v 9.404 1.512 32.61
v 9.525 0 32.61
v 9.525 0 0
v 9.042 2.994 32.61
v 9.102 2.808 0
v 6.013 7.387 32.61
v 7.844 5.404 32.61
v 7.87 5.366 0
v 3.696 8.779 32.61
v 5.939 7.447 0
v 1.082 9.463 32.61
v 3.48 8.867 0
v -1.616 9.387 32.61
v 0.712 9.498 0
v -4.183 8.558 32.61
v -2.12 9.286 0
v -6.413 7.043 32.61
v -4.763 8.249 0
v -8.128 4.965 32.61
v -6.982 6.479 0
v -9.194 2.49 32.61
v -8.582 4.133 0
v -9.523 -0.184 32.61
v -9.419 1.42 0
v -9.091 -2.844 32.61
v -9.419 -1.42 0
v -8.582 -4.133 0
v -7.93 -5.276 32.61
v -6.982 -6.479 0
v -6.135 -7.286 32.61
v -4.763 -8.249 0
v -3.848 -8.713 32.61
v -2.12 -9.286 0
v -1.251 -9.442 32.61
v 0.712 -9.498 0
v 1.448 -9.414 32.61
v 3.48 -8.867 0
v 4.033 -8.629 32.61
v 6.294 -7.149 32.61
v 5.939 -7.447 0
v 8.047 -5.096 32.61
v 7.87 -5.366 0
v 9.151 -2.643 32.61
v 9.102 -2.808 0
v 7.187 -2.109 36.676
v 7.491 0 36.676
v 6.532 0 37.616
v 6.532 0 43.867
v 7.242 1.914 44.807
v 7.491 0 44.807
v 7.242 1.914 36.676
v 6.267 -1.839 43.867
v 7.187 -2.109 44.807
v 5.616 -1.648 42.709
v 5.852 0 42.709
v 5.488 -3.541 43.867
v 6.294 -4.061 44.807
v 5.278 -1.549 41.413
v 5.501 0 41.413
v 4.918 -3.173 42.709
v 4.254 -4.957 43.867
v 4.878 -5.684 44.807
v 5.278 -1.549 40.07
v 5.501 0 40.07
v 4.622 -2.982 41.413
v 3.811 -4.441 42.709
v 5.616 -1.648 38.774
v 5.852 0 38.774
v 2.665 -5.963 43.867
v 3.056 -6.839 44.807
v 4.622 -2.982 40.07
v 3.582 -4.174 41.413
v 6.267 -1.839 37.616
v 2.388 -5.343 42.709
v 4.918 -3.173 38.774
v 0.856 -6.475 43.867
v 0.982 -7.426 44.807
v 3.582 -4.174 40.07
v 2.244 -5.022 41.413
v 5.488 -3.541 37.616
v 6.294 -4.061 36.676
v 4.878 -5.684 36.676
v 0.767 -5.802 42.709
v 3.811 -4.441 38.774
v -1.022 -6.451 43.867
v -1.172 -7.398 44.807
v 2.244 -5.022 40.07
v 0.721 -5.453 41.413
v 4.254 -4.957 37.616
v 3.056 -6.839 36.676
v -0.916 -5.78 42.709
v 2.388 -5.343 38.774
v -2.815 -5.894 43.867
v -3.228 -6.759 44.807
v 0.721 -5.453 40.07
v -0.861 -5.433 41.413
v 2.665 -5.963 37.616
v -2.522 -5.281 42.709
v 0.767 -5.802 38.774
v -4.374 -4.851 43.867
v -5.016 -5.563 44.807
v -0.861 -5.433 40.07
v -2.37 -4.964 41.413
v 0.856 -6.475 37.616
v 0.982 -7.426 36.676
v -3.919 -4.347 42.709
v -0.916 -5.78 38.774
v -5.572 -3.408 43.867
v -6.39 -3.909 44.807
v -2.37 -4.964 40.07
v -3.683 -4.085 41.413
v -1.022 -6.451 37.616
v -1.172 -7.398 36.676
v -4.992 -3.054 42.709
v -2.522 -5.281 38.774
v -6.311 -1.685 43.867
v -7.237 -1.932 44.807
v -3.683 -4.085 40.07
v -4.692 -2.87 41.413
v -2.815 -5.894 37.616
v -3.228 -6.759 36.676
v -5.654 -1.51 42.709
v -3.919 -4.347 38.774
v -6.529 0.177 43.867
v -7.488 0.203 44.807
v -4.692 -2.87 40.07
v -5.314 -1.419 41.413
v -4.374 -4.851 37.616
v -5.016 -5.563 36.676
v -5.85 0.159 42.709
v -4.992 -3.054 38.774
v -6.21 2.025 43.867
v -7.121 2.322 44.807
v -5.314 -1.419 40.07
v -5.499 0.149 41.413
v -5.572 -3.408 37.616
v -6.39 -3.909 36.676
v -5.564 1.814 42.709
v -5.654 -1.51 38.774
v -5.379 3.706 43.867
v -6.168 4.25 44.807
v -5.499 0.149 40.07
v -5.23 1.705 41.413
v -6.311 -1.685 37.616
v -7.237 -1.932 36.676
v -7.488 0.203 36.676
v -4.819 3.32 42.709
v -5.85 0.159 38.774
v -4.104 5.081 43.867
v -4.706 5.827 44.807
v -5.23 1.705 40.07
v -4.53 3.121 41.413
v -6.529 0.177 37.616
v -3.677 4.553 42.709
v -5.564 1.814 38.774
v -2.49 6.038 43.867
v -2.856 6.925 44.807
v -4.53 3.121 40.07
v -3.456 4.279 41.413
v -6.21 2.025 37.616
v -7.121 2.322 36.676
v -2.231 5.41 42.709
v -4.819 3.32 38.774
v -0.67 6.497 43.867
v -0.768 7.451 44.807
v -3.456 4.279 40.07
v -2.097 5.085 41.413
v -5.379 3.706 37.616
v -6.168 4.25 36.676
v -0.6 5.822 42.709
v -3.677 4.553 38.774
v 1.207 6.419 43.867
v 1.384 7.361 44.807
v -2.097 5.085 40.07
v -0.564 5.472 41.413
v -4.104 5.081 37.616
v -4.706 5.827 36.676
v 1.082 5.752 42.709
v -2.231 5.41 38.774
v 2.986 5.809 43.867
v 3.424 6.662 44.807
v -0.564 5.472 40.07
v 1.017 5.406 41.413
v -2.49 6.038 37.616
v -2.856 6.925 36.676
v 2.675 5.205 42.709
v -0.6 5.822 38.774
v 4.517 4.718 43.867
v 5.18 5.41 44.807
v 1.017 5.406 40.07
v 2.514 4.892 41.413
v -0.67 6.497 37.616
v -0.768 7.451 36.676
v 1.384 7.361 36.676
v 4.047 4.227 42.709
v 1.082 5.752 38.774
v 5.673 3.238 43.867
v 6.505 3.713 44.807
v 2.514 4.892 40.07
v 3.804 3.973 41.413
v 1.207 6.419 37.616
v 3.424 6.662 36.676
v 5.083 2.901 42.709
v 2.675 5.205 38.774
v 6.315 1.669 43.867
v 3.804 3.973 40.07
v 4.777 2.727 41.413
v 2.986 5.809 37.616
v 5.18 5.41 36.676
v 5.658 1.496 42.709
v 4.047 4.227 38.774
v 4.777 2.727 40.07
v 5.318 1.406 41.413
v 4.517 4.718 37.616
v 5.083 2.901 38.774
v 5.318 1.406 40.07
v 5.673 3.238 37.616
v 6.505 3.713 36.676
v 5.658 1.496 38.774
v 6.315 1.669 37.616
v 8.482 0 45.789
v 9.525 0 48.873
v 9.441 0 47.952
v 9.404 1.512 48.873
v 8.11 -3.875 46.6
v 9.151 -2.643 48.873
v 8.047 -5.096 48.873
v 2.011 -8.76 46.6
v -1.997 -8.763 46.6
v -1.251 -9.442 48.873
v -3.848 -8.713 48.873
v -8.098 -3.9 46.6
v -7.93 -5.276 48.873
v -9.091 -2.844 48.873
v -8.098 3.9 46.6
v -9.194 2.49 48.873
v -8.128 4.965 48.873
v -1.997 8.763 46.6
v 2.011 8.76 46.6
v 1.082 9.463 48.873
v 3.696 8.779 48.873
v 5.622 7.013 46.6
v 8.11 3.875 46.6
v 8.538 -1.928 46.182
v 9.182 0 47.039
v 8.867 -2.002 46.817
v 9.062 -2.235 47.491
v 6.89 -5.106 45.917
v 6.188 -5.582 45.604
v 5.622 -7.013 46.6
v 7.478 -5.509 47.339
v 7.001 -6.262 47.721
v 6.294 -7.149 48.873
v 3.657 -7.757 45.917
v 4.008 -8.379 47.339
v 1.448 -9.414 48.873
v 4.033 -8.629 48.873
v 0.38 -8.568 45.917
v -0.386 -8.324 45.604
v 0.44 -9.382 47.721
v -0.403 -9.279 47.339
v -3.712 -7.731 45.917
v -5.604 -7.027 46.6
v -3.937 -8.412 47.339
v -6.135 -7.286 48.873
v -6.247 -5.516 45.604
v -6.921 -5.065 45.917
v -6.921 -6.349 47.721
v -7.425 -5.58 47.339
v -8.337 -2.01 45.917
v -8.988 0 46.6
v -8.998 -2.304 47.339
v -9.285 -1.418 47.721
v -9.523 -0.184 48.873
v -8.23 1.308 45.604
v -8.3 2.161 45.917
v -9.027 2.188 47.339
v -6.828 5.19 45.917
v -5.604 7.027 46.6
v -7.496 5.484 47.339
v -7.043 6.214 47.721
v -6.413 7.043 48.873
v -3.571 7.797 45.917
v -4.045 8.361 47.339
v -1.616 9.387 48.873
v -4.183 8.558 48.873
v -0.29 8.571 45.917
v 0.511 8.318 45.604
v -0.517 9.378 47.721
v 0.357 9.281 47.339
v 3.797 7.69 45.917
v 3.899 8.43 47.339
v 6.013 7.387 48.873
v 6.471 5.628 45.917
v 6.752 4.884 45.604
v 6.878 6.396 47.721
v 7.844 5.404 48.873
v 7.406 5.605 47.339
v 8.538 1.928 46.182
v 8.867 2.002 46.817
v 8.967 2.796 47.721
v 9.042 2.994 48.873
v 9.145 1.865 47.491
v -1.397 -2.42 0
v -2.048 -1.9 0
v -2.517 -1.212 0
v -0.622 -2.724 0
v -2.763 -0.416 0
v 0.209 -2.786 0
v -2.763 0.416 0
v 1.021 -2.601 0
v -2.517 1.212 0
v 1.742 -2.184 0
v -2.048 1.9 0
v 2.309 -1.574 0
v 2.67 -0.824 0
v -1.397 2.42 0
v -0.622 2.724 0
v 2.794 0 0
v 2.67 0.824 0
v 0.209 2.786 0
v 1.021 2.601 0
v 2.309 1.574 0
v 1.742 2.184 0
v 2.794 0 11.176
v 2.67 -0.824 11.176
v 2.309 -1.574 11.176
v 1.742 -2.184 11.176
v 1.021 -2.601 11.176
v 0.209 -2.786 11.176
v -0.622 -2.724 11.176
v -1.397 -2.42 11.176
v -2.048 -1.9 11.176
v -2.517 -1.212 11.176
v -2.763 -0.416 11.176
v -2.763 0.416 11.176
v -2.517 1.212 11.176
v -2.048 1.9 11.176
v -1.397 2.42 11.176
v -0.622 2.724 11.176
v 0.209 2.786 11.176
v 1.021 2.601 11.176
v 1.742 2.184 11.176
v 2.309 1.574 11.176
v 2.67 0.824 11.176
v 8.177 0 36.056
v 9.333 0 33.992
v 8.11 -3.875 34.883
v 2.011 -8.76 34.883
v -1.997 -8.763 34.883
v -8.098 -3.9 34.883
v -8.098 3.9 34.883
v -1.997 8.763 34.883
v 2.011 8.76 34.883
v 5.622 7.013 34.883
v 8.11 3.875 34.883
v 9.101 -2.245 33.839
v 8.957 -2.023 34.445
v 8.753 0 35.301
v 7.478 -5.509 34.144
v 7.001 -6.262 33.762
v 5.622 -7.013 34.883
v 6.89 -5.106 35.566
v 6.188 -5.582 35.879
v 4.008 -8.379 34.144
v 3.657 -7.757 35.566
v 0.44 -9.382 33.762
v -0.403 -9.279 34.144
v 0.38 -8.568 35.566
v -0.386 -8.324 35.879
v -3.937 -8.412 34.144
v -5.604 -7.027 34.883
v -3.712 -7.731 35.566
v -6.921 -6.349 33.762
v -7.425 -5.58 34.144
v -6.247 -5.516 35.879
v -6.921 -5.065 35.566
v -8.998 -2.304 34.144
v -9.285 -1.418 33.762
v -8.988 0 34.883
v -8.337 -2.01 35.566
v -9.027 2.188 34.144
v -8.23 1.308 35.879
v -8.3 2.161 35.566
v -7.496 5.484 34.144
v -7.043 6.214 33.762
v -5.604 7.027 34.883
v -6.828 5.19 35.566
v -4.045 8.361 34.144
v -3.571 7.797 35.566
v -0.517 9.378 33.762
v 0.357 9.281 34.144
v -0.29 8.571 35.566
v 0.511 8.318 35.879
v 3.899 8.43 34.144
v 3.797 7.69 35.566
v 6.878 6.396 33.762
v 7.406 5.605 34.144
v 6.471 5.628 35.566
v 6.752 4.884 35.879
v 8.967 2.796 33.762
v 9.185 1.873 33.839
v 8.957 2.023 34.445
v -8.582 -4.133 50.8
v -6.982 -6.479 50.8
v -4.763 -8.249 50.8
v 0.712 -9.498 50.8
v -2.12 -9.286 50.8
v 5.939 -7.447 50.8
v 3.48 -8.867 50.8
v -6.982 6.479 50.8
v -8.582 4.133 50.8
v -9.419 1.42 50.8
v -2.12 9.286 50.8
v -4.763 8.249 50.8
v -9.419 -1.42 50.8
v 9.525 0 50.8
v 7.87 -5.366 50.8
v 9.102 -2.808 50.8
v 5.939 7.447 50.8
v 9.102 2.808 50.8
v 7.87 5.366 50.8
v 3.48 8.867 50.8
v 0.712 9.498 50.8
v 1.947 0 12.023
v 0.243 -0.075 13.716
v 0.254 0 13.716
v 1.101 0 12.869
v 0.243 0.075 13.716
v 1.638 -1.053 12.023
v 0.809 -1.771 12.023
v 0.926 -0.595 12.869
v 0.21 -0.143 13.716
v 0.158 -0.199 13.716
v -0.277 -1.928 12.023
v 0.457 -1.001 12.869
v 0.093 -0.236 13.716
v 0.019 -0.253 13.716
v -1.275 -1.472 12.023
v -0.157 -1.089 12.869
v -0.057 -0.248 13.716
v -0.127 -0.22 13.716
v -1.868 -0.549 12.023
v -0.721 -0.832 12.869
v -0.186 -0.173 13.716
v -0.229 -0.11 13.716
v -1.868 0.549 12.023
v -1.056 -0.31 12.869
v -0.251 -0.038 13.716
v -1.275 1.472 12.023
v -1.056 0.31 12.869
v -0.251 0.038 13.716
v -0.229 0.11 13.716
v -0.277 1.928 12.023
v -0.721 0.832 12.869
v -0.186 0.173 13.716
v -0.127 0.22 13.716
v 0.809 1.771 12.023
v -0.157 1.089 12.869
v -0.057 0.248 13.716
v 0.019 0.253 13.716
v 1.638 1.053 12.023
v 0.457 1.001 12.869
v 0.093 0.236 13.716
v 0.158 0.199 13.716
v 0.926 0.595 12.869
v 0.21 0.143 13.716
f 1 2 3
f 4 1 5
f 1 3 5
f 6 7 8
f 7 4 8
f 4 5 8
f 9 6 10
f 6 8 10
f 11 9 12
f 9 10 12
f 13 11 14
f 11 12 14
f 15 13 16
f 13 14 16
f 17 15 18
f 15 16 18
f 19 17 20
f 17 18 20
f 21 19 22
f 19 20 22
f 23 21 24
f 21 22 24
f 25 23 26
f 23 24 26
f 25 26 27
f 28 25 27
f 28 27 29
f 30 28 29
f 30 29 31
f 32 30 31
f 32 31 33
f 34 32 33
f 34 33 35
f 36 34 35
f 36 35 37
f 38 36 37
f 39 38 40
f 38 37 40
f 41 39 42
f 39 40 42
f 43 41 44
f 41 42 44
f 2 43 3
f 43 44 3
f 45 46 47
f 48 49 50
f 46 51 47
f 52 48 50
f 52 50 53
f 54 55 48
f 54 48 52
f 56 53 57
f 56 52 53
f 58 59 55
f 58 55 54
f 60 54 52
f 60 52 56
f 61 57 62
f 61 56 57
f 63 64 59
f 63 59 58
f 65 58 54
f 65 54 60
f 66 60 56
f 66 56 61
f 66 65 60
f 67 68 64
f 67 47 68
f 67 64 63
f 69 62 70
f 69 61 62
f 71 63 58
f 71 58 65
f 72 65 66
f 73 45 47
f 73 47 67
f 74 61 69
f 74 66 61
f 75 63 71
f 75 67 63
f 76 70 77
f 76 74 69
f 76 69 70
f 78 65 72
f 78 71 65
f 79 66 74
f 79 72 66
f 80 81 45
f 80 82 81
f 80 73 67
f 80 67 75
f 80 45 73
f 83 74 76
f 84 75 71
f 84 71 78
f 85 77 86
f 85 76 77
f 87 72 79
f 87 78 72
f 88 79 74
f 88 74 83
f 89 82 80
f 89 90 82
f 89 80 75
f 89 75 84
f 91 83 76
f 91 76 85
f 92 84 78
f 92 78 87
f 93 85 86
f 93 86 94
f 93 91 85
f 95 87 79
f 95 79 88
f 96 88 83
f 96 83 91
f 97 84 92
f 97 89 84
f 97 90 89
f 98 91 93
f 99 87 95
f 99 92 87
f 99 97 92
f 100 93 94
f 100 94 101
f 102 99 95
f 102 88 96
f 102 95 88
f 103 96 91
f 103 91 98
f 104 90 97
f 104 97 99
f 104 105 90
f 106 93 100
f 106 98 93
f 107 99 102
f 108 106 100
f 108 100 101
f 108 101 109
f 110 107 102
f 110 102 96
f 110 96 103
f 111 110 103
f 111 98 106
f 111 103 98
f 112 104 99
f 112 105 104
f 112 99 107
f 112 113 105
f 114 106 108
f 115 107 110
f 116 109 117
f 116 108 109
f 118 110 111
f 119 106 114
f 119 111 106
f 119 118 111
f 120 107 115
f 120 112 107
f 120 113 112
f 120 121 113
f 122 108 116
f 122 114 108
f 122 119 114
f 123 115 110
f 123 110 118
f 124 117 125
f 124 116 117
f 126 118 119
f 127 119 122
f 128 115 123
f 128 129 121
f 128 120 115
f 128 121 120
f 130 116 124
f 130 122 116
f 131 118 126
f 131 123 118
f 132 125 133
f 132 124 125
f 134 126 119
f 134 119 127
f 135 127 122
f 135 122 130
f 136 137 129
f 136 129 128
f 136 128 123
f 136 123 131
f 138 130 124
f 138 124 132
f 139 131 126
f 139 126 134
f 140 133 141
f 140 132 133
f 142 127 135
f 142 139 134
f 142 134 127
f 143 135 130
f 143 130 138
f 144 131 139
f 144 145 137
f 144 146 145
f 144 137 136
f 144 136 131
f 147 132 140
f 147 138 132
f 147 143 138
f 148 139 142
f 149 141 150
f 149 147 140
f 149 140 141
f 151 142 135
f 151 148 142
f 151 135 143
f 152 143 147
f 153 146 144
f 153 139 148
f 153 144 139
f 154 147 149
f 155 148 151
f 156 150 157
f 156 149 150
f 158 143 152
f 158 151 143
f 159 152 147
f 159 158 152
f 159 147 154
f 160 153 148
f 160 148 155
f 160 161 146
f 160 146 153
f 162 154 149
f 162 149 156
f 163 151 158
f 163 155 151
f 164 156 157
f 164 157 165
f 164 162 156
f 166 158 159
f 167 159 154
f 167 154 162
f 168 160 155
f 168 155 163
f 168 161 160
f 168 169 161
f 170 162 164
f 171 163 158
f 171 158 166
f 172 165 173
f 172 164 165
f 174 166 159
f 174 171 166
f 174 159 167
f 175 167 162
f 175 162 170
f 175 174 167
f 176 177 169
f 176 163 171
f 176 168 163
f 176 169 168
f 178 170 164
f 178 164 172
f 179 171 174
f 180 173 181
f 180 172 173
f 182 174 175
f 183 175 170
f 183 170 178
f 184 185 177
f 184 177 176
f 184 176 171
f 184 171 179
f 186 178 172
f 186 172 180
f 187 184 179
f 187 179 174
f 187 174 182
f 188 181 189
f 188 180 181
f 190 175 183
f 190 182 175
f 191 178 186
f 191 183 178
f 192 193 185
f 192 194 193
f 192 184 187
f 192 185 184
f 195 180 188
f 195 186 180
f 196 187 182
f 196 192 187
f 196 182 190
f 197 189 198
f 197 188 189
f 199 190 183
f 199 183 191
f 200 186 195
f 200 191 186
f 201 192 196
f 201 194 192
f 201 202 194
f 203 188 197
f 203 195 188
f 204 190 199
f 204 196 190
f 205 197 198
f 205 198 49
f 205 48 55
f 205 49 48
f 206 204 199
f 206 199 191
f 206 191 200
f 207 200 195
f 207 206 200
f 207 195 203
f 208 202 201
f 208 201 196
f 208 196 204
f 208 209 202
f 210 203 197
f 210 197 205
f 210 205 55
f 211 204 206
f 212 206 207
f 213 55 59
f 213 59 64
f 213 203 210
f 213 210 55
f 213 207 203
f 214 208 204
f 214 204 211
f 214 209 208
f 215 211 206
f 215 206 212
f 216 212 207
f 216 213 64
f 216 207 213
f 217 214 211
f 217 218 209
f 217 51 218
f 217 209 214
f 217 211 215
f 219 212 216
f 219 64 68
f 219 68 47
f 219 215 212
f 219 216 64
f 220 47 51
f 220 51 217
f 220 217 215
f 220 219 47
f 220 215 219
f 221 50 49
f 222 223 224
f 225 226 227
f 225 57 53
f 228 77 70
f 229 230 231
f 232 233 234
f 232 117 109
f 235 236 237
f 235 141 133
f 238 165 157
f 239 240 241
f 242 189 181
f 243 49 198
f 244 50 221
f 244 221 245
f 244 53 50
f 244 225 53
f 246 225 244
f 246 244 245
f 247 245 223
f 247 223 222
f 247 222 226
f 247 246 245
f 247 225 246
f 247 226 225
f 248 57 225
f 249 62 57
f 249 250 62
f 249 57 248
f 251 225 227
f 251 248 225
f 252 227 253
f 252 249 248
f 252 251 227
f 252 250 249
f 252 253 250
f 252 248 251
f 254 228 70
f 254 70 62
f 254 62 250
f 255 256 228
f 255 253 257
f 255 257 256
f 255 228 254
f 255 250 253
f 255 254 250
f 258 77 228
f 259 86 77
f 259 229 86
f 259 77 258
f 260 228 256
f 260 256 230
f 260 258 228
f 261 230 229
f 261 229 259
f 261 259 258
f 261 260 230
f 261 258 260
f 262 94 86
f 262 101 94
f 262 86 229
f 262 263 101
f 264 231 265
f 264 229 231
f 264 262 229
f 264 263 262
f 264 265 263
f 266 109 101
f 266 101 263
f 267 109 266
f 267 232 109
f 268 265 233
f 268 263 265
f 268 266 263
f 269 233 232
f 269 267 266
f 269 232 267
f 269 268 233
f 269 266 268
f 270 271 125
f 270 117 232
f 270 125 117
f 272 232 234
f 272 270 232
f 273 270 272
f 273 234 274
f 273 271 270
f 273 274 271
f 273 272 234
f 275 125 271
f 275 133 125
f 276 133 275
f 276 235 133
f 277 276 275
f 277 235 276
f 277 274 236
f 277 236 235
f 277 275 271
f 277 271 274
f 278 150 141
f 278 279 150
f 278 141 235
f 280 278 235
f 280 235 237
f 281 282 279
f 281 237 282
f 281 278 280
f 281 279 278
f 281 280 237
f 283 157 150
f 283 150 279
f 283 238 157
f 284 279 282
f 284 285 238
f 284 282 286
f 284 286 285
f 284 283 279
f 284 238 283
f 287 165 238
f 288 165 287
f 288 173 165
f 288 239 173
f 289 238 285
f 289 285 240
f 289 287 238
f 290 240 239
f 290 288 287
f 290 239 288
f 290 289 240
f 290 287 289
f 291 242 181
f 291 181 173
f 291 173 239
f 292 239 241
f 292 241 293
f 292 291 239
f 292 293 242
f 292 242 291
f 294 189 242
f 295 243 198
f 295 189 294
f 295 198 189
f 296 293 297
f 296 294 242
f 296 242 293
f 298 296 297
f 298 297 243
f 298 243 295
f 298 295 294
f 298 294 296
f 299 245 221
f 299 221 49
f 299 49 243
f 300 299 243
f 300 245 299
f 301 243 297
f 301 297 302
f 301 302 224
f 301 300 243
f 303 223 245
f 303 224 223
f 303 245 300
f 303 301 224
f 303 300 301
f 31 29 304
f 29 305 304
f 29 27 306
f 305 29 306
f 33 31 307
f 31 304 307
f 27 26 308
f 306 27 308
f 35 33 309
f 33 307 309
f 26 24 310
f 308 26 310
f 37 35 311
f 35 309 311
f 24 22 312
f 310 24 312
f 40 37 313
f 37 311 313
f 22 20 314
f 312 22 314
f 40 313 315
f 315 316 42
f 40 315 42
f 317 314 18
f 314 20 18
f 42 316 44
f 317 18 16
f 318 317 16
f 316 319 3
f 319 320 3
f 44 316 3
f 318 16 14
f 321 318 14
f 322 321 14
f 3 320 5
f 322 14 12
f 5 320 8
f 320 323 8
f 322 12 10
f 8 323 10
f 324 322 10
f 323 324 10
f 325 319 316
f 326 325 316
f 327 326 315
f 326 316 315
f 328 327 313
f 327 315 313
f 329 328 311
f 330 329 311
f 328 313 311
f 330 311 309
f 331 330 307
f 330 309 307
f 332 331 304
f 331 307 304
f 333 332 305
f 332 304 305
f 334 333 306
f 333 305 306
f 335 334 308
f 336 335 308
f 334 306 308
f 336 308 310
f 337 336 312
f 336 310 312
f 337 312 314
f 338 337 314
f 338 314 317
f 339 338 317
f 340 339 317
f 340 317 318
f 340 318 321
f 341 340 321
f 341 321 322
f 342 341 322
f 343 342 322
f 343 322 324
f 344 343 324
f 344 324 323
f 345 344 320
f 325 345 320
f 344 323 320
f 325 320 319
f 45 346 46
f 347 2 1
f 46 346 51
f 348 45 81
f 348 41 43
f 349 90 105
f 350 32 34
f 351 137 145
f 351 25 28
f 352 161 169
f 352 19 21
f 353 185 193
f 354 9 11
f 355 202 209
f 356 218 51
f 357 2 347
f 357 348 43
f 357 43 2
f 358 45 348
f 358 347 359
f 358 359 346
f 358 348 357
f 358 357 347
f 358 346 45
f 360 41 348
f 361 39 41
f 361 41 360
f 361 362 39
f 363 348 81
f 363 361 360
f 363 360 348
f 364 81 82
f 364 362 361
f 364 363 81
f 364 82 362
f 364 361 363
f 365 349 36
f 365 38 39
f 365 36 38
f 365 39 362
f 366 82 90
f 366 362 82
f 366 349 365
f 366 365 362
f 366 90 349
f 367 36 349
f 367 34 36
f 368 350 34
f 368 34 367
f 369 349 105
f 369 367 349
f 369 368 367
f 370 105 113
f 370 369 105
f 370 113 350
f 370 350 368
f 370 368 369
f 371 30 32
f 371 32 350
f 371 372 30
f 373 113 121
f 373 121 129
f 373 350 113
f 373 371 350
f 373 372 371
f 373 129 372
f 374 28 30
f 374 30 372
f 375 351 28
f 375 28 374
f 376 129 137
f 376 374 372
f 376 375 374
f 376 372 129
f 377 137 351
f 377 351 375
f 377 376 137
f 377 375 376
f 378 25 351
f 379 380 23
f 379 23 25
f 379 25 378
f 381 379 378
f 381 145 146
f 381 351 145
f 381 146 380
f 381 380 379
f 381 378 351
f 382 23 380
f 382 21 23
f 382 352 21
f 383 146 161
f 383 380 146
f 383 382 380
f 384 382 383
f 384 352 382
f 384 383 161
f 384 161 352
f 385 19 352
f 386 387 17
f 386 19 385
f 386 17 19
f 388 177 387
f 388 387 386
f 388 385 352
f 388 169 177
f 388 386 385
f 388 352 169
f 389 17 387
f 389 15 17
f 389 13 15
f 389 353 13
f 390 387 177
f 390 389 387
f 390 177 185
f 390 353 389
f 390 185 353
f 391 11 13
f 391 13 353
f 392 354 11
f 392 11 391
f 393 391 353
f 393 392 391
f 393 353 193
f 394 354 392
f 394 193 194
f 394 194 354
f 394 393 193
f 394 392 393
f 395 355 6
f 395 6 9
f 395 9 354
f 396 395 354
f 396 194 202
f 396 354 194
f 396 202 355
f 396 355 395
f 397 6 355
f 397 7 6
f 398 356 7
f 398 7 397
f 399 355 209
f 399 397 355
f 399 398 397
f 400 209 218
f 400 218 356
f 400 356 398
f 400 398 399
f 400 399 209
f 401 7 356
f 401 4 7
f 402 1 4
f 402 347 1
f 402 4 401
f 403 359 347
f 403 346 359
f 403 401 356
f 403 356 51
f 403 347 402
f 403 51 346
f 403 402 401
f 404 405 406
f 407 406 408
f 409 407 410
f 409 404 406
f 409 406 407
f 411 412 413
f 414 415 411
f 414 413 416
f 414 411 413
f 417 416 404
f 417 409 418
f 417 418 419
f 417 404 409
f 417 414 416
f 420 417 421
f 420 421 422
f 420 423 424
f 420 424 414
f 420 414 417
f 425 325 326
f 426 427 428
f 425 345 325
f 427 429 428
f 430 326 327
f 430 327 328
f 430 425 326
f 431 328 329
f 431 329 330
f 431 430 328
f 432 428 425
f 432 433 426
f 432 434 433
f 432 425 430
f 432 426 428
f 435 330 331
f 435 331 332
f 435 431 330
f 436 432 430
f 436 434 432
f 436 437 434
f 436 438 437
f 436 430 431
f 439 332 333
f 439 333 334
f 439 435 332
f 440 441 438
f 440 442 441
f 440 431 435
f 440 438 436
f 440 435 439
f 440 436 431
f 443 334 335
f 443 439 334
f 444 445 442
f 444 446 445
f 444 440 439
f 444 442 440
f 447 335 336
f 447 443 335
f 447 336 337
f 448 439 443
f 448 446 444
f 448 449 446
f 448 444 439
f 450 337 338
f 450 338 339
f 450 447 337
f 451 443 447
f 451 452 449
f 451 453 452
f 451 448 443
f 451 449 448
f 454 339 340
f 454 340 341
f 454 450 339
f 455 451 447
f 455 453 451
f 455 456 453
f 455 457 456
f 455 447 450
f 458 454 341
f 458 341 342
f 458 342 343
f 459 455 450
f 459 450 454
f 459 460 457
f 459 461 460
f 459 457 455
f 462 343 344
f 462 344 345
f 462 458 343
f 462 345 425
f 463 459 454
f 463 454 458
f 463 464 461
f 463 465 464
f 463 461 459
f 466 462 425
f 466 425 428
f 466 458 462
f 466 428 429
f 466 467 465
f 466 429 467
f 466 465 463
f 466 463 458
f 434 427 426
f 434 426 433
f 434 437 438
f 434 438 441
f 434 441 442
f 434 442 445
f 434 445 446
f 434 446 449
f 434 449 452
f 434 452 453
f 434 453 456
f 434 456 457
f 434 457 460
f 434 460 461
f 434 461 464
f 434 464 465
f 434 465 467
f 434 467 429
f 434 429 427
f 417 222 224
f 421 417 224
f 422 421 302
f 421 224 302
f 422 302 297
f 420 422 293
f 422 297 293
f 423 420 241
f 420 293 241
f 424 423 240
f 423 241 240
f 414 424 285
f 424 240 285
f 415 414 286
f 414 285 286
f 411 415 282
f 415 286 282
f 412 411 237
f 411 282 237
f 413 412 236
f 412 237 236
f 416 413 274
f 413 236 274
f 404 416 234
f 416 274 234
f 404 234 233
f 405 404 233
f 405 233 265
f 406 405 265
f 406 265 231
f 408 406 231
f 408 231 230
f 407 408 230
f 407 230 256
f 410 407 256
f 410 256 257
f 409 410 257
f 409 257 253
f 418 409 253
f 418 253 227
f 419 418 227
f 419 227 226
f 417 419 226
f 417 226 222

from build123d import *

# Parameters (mm, degrees)
F0_R     = 9.525
F1_DEPTH = 50.8
F4_R     = 5.08
F5_R     = 2.794
F6_DEPTH = 13.716
F7_SIZE  = 2.54


with BuildPart() as f1:
    # F0 (on Top) → F1 (new body)
    with BuildSketch(Plane.XY):
        Circle(F0_R)
    extrude(amount=F1_DEPTH)

    # F2 (on Front) → F3 (revolve, cut)
    with BuildSketch(Plane.XZ):
        with BuildLine():
            Line((9.525, 35.7632638335), (9.525, 45.72))
            ThreePointArc((9.525, 45.72), (5.4560644034, 40.7416319168), (9.525, 35.7632638335))
        make_face()
    revolve(axis=Axis((0, 0, -23.9516440779), (0, 0, -1)), mode=Mode.SUBTRACT)

    # F4
    f4_edges = [f1.edges().sort_by_distance(p)[0] for p in [
        (-9.525, 0, 45.72),
        (-9.525, 0, 35.763264),
    ]]
    fillet(f4_edges, radius=F4_R)

    # F5 (on face) → F6 (cut)
    with BuildSketch(Plane(origin=(0, 0, 0), x_dir=(1, 0, 0), z_dir=(0, 0, -1))):
        Circle(F5_R)
    extrude(amount=-F6_DEPTH, mode=Mode.SUBTRACT)

    # F7
    f7_edges = [f1.edges().sort_by_distance(p)[0] for p in [
        (-2.794, 0, 13.716),
    ]]
    chamfer(f7_edges, length=F7_SIZE)


solid = f1.part
